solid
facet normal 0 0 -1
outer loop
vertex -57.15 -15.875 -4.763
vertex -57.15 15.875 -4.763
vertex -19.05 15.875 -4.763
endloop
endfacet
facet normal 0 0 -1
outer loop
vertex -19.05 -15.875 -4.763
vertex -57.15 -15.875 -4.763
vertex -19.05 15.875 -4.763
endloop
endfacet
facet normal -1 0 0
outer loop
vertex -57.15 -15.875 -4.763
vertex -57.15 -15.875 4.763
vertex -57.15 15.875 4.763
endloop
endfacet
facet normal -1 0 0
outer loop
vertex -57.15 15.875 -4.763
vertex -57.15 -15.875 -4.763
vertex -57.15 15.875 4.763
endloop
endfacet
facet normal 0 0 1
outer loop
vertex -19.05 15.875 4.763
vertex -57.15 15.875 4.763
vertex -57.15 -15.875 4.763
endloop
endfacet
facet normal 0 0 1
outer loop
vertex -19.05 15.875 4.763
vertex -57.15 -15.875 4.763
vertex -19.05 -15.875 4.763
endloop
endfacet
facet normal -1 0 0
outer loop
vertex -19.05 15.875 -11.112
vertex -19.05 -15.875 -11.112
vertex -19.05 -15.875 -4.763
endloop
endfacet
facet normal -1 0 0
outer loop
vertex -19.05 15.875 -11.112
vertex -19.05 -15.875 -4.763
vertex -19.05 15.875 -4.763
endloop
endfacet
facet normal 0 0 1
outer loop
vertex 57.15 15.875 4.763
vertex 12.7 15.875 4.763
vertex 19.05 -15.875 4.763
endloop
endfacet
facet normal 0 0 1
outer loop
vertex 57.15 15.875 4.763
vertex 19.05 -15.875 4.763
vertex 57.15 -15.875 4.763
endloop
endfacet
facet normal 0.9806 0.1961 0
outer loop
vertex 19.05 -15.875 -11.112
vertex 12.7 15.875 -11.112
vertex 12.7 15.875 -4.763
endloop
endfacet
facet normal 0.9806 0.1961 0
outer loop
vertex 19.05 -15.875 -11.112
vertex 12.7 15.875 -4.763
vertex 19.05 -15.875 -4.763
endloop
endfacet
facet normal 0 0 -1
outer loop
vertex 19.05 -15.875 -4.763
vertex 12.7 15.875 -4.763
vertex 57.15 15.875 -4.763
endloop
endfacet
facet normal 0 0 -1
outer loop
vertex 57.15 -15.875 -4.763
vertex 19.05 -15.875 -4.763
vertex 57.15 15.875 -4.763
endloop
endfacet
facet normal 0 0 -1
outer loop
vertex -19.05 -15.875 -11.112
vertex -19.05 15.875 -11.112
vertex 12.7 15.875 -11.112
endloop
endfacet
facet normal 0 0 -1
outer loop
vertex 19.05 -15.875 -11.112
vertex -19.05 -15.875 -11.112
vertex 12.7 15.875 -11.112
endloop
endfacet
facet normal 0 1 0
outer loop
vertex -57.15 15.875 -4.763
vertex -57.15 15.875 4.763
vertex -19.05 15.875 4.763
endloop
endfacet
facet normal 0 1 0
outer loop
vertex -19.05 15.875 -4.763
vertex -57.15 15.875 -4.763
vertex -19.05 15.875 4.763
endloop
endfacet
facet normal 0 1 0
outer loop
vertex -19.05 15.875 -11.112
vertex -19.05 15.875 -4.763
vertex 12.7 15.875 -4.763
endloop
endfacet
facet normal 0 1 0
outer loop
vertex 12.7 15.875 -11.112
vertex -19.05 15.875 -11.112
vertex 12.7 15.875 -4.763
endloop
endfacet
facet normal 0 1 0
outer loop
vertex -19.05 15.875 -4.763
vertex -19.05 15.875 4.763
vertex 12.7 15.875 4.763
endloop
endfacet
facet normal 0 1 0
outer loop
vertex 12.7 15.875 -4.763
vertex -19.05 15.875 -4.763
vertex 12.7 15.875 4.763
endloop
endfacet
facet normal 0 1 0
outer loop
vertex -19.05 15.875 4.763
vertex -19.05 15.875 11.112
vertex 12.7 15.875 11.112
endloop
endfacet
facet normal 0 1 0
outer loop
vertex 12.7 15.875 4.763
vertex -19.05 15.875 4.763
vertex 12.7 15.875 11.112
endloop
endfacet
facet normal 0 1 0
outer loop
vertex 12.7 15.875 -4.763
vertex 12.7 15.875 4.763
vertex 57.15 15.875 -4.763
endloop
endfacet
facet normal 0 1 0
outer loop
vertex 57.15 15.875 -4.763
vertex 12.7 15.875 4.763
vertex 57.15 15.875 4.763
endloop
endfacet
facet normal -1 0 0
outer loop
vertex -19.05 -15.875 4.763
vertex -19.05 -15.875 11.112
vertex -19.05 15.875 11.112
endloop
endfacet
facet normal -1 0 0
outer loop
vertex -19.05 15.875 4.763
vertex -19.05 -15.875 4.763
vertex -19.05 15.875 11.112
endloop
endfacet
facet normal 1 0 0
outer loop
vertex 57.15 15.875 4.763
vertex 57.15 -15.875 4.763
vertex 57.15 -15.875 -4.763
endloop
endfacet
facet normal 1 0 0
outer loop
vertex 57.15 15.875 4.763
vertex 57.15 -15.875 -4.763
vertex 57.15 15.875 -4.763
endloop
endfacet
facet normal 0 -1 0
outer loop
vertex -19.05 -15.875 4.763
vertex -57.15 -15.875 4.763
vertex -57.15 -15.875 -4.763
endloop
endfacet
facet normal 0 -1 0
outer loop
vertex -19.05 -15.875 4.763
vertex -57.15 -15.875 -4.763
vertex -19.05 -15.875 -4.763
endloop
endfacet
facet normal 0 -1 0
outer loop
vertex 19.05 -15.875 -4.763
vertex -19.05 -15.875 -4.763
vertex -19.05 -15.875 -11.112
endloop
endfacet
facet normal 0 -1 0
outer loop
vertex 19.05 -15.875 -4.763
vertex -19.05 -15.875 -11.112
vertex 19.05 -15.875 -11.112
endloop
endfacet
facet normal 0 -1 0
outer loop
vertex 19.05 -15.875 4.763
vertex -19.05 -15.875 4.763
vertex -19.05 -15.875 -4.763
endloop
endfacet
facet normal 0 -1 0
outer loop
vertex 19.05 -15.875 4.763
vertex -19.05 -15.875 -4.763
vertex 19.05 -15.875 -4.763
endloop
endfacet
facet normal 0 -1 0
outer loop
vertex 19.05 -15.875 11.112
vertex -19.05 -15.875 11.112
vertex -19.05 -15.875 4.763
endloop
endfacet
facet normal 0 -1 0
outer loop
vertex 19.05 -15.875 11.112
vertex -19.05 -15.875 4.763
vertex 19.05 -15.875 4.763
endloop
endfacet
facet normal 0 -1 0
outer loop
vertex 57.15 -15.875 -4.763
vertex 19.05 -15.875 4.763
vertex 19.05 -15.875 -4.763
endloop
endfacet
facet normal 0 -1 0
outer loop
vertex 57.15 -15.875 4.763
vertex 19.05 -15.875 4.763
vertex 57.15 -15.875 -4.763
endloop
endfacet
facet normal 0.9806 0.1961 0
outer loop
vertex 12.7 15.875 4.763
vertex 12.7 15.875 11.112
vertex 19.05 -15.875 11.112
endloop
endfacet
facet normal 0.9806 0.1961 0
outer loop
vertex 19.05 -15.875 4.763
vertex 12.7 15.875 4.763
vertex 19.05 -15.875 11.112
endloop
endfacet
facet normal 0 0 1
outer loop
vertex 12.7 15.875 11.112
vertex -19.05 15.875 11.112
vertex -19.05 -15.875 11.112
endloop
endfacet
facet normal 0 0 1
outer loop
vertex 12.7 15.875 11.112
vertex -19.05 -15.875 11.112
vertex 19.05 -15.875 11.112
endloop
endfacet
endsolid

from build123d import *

# Parameters (mm, degrees)
F0_W     = 114.3
F0_H     = 31.75
F1_DEPTH = 11.1125
F2_W     = 38.1
F2_H     = 31.75
F3_DEPTH = 6.35
F5_DEPTH = 6.35


# Not quite as in the source:
# - a feature of the source that left no trace in its solid (it failed there, or was rolled back) is left out
# - a pattern or mirror of a feature is missing from the dataset's text; its kind, count and spacing are read off the source's solid


with BuildPart() as f1:
    # F0 (on Top) → F1 (new body, symmetric)
    with BuildSketch(Plane.XY):
        Rectangle(F0_W, F0_H)
    extrude(amount=F1_DEPTH, both=True)

    # F2 (on face) → F3 (cut)
    with BuildSketch(Plane.XY.offset(11.1125)):
        with Locations((-38.1, 0)):
            Rectangle(F2_W, F2_H)
    f3 = extrude(amount=-F3_DEPTH, mode=Mode.SUBTRACT)

    # F3_copies: F3 across plane
    add(f3.mirror(Plane(origin=(0, 0, 0), x_dir=(-1, 0, 0), z_dir=(0, 0, -1))), mode=Mode.SUBTRACT)

    # F4 (on face) → F5 (cut)
    with BuildSketch(Plane.XY.offset(11.1125)):
        Polygon((57.15, -15.875), (57.15, 15.875), (12.7, 15.875), (19.05, -15.875), align=None)
    f5 = extrude(amount=-F5_DEPTH, mode=Mode.SUBTRACT)

    # F5_copies: F5 across plane
    add(f5.mirror(Plane(origin=(0, 0, 0), x_dir=(-1, 0, 0), z_dir=(0, 0, -1))), mode=Mode.SUBTRACT)


solid = f1.part
